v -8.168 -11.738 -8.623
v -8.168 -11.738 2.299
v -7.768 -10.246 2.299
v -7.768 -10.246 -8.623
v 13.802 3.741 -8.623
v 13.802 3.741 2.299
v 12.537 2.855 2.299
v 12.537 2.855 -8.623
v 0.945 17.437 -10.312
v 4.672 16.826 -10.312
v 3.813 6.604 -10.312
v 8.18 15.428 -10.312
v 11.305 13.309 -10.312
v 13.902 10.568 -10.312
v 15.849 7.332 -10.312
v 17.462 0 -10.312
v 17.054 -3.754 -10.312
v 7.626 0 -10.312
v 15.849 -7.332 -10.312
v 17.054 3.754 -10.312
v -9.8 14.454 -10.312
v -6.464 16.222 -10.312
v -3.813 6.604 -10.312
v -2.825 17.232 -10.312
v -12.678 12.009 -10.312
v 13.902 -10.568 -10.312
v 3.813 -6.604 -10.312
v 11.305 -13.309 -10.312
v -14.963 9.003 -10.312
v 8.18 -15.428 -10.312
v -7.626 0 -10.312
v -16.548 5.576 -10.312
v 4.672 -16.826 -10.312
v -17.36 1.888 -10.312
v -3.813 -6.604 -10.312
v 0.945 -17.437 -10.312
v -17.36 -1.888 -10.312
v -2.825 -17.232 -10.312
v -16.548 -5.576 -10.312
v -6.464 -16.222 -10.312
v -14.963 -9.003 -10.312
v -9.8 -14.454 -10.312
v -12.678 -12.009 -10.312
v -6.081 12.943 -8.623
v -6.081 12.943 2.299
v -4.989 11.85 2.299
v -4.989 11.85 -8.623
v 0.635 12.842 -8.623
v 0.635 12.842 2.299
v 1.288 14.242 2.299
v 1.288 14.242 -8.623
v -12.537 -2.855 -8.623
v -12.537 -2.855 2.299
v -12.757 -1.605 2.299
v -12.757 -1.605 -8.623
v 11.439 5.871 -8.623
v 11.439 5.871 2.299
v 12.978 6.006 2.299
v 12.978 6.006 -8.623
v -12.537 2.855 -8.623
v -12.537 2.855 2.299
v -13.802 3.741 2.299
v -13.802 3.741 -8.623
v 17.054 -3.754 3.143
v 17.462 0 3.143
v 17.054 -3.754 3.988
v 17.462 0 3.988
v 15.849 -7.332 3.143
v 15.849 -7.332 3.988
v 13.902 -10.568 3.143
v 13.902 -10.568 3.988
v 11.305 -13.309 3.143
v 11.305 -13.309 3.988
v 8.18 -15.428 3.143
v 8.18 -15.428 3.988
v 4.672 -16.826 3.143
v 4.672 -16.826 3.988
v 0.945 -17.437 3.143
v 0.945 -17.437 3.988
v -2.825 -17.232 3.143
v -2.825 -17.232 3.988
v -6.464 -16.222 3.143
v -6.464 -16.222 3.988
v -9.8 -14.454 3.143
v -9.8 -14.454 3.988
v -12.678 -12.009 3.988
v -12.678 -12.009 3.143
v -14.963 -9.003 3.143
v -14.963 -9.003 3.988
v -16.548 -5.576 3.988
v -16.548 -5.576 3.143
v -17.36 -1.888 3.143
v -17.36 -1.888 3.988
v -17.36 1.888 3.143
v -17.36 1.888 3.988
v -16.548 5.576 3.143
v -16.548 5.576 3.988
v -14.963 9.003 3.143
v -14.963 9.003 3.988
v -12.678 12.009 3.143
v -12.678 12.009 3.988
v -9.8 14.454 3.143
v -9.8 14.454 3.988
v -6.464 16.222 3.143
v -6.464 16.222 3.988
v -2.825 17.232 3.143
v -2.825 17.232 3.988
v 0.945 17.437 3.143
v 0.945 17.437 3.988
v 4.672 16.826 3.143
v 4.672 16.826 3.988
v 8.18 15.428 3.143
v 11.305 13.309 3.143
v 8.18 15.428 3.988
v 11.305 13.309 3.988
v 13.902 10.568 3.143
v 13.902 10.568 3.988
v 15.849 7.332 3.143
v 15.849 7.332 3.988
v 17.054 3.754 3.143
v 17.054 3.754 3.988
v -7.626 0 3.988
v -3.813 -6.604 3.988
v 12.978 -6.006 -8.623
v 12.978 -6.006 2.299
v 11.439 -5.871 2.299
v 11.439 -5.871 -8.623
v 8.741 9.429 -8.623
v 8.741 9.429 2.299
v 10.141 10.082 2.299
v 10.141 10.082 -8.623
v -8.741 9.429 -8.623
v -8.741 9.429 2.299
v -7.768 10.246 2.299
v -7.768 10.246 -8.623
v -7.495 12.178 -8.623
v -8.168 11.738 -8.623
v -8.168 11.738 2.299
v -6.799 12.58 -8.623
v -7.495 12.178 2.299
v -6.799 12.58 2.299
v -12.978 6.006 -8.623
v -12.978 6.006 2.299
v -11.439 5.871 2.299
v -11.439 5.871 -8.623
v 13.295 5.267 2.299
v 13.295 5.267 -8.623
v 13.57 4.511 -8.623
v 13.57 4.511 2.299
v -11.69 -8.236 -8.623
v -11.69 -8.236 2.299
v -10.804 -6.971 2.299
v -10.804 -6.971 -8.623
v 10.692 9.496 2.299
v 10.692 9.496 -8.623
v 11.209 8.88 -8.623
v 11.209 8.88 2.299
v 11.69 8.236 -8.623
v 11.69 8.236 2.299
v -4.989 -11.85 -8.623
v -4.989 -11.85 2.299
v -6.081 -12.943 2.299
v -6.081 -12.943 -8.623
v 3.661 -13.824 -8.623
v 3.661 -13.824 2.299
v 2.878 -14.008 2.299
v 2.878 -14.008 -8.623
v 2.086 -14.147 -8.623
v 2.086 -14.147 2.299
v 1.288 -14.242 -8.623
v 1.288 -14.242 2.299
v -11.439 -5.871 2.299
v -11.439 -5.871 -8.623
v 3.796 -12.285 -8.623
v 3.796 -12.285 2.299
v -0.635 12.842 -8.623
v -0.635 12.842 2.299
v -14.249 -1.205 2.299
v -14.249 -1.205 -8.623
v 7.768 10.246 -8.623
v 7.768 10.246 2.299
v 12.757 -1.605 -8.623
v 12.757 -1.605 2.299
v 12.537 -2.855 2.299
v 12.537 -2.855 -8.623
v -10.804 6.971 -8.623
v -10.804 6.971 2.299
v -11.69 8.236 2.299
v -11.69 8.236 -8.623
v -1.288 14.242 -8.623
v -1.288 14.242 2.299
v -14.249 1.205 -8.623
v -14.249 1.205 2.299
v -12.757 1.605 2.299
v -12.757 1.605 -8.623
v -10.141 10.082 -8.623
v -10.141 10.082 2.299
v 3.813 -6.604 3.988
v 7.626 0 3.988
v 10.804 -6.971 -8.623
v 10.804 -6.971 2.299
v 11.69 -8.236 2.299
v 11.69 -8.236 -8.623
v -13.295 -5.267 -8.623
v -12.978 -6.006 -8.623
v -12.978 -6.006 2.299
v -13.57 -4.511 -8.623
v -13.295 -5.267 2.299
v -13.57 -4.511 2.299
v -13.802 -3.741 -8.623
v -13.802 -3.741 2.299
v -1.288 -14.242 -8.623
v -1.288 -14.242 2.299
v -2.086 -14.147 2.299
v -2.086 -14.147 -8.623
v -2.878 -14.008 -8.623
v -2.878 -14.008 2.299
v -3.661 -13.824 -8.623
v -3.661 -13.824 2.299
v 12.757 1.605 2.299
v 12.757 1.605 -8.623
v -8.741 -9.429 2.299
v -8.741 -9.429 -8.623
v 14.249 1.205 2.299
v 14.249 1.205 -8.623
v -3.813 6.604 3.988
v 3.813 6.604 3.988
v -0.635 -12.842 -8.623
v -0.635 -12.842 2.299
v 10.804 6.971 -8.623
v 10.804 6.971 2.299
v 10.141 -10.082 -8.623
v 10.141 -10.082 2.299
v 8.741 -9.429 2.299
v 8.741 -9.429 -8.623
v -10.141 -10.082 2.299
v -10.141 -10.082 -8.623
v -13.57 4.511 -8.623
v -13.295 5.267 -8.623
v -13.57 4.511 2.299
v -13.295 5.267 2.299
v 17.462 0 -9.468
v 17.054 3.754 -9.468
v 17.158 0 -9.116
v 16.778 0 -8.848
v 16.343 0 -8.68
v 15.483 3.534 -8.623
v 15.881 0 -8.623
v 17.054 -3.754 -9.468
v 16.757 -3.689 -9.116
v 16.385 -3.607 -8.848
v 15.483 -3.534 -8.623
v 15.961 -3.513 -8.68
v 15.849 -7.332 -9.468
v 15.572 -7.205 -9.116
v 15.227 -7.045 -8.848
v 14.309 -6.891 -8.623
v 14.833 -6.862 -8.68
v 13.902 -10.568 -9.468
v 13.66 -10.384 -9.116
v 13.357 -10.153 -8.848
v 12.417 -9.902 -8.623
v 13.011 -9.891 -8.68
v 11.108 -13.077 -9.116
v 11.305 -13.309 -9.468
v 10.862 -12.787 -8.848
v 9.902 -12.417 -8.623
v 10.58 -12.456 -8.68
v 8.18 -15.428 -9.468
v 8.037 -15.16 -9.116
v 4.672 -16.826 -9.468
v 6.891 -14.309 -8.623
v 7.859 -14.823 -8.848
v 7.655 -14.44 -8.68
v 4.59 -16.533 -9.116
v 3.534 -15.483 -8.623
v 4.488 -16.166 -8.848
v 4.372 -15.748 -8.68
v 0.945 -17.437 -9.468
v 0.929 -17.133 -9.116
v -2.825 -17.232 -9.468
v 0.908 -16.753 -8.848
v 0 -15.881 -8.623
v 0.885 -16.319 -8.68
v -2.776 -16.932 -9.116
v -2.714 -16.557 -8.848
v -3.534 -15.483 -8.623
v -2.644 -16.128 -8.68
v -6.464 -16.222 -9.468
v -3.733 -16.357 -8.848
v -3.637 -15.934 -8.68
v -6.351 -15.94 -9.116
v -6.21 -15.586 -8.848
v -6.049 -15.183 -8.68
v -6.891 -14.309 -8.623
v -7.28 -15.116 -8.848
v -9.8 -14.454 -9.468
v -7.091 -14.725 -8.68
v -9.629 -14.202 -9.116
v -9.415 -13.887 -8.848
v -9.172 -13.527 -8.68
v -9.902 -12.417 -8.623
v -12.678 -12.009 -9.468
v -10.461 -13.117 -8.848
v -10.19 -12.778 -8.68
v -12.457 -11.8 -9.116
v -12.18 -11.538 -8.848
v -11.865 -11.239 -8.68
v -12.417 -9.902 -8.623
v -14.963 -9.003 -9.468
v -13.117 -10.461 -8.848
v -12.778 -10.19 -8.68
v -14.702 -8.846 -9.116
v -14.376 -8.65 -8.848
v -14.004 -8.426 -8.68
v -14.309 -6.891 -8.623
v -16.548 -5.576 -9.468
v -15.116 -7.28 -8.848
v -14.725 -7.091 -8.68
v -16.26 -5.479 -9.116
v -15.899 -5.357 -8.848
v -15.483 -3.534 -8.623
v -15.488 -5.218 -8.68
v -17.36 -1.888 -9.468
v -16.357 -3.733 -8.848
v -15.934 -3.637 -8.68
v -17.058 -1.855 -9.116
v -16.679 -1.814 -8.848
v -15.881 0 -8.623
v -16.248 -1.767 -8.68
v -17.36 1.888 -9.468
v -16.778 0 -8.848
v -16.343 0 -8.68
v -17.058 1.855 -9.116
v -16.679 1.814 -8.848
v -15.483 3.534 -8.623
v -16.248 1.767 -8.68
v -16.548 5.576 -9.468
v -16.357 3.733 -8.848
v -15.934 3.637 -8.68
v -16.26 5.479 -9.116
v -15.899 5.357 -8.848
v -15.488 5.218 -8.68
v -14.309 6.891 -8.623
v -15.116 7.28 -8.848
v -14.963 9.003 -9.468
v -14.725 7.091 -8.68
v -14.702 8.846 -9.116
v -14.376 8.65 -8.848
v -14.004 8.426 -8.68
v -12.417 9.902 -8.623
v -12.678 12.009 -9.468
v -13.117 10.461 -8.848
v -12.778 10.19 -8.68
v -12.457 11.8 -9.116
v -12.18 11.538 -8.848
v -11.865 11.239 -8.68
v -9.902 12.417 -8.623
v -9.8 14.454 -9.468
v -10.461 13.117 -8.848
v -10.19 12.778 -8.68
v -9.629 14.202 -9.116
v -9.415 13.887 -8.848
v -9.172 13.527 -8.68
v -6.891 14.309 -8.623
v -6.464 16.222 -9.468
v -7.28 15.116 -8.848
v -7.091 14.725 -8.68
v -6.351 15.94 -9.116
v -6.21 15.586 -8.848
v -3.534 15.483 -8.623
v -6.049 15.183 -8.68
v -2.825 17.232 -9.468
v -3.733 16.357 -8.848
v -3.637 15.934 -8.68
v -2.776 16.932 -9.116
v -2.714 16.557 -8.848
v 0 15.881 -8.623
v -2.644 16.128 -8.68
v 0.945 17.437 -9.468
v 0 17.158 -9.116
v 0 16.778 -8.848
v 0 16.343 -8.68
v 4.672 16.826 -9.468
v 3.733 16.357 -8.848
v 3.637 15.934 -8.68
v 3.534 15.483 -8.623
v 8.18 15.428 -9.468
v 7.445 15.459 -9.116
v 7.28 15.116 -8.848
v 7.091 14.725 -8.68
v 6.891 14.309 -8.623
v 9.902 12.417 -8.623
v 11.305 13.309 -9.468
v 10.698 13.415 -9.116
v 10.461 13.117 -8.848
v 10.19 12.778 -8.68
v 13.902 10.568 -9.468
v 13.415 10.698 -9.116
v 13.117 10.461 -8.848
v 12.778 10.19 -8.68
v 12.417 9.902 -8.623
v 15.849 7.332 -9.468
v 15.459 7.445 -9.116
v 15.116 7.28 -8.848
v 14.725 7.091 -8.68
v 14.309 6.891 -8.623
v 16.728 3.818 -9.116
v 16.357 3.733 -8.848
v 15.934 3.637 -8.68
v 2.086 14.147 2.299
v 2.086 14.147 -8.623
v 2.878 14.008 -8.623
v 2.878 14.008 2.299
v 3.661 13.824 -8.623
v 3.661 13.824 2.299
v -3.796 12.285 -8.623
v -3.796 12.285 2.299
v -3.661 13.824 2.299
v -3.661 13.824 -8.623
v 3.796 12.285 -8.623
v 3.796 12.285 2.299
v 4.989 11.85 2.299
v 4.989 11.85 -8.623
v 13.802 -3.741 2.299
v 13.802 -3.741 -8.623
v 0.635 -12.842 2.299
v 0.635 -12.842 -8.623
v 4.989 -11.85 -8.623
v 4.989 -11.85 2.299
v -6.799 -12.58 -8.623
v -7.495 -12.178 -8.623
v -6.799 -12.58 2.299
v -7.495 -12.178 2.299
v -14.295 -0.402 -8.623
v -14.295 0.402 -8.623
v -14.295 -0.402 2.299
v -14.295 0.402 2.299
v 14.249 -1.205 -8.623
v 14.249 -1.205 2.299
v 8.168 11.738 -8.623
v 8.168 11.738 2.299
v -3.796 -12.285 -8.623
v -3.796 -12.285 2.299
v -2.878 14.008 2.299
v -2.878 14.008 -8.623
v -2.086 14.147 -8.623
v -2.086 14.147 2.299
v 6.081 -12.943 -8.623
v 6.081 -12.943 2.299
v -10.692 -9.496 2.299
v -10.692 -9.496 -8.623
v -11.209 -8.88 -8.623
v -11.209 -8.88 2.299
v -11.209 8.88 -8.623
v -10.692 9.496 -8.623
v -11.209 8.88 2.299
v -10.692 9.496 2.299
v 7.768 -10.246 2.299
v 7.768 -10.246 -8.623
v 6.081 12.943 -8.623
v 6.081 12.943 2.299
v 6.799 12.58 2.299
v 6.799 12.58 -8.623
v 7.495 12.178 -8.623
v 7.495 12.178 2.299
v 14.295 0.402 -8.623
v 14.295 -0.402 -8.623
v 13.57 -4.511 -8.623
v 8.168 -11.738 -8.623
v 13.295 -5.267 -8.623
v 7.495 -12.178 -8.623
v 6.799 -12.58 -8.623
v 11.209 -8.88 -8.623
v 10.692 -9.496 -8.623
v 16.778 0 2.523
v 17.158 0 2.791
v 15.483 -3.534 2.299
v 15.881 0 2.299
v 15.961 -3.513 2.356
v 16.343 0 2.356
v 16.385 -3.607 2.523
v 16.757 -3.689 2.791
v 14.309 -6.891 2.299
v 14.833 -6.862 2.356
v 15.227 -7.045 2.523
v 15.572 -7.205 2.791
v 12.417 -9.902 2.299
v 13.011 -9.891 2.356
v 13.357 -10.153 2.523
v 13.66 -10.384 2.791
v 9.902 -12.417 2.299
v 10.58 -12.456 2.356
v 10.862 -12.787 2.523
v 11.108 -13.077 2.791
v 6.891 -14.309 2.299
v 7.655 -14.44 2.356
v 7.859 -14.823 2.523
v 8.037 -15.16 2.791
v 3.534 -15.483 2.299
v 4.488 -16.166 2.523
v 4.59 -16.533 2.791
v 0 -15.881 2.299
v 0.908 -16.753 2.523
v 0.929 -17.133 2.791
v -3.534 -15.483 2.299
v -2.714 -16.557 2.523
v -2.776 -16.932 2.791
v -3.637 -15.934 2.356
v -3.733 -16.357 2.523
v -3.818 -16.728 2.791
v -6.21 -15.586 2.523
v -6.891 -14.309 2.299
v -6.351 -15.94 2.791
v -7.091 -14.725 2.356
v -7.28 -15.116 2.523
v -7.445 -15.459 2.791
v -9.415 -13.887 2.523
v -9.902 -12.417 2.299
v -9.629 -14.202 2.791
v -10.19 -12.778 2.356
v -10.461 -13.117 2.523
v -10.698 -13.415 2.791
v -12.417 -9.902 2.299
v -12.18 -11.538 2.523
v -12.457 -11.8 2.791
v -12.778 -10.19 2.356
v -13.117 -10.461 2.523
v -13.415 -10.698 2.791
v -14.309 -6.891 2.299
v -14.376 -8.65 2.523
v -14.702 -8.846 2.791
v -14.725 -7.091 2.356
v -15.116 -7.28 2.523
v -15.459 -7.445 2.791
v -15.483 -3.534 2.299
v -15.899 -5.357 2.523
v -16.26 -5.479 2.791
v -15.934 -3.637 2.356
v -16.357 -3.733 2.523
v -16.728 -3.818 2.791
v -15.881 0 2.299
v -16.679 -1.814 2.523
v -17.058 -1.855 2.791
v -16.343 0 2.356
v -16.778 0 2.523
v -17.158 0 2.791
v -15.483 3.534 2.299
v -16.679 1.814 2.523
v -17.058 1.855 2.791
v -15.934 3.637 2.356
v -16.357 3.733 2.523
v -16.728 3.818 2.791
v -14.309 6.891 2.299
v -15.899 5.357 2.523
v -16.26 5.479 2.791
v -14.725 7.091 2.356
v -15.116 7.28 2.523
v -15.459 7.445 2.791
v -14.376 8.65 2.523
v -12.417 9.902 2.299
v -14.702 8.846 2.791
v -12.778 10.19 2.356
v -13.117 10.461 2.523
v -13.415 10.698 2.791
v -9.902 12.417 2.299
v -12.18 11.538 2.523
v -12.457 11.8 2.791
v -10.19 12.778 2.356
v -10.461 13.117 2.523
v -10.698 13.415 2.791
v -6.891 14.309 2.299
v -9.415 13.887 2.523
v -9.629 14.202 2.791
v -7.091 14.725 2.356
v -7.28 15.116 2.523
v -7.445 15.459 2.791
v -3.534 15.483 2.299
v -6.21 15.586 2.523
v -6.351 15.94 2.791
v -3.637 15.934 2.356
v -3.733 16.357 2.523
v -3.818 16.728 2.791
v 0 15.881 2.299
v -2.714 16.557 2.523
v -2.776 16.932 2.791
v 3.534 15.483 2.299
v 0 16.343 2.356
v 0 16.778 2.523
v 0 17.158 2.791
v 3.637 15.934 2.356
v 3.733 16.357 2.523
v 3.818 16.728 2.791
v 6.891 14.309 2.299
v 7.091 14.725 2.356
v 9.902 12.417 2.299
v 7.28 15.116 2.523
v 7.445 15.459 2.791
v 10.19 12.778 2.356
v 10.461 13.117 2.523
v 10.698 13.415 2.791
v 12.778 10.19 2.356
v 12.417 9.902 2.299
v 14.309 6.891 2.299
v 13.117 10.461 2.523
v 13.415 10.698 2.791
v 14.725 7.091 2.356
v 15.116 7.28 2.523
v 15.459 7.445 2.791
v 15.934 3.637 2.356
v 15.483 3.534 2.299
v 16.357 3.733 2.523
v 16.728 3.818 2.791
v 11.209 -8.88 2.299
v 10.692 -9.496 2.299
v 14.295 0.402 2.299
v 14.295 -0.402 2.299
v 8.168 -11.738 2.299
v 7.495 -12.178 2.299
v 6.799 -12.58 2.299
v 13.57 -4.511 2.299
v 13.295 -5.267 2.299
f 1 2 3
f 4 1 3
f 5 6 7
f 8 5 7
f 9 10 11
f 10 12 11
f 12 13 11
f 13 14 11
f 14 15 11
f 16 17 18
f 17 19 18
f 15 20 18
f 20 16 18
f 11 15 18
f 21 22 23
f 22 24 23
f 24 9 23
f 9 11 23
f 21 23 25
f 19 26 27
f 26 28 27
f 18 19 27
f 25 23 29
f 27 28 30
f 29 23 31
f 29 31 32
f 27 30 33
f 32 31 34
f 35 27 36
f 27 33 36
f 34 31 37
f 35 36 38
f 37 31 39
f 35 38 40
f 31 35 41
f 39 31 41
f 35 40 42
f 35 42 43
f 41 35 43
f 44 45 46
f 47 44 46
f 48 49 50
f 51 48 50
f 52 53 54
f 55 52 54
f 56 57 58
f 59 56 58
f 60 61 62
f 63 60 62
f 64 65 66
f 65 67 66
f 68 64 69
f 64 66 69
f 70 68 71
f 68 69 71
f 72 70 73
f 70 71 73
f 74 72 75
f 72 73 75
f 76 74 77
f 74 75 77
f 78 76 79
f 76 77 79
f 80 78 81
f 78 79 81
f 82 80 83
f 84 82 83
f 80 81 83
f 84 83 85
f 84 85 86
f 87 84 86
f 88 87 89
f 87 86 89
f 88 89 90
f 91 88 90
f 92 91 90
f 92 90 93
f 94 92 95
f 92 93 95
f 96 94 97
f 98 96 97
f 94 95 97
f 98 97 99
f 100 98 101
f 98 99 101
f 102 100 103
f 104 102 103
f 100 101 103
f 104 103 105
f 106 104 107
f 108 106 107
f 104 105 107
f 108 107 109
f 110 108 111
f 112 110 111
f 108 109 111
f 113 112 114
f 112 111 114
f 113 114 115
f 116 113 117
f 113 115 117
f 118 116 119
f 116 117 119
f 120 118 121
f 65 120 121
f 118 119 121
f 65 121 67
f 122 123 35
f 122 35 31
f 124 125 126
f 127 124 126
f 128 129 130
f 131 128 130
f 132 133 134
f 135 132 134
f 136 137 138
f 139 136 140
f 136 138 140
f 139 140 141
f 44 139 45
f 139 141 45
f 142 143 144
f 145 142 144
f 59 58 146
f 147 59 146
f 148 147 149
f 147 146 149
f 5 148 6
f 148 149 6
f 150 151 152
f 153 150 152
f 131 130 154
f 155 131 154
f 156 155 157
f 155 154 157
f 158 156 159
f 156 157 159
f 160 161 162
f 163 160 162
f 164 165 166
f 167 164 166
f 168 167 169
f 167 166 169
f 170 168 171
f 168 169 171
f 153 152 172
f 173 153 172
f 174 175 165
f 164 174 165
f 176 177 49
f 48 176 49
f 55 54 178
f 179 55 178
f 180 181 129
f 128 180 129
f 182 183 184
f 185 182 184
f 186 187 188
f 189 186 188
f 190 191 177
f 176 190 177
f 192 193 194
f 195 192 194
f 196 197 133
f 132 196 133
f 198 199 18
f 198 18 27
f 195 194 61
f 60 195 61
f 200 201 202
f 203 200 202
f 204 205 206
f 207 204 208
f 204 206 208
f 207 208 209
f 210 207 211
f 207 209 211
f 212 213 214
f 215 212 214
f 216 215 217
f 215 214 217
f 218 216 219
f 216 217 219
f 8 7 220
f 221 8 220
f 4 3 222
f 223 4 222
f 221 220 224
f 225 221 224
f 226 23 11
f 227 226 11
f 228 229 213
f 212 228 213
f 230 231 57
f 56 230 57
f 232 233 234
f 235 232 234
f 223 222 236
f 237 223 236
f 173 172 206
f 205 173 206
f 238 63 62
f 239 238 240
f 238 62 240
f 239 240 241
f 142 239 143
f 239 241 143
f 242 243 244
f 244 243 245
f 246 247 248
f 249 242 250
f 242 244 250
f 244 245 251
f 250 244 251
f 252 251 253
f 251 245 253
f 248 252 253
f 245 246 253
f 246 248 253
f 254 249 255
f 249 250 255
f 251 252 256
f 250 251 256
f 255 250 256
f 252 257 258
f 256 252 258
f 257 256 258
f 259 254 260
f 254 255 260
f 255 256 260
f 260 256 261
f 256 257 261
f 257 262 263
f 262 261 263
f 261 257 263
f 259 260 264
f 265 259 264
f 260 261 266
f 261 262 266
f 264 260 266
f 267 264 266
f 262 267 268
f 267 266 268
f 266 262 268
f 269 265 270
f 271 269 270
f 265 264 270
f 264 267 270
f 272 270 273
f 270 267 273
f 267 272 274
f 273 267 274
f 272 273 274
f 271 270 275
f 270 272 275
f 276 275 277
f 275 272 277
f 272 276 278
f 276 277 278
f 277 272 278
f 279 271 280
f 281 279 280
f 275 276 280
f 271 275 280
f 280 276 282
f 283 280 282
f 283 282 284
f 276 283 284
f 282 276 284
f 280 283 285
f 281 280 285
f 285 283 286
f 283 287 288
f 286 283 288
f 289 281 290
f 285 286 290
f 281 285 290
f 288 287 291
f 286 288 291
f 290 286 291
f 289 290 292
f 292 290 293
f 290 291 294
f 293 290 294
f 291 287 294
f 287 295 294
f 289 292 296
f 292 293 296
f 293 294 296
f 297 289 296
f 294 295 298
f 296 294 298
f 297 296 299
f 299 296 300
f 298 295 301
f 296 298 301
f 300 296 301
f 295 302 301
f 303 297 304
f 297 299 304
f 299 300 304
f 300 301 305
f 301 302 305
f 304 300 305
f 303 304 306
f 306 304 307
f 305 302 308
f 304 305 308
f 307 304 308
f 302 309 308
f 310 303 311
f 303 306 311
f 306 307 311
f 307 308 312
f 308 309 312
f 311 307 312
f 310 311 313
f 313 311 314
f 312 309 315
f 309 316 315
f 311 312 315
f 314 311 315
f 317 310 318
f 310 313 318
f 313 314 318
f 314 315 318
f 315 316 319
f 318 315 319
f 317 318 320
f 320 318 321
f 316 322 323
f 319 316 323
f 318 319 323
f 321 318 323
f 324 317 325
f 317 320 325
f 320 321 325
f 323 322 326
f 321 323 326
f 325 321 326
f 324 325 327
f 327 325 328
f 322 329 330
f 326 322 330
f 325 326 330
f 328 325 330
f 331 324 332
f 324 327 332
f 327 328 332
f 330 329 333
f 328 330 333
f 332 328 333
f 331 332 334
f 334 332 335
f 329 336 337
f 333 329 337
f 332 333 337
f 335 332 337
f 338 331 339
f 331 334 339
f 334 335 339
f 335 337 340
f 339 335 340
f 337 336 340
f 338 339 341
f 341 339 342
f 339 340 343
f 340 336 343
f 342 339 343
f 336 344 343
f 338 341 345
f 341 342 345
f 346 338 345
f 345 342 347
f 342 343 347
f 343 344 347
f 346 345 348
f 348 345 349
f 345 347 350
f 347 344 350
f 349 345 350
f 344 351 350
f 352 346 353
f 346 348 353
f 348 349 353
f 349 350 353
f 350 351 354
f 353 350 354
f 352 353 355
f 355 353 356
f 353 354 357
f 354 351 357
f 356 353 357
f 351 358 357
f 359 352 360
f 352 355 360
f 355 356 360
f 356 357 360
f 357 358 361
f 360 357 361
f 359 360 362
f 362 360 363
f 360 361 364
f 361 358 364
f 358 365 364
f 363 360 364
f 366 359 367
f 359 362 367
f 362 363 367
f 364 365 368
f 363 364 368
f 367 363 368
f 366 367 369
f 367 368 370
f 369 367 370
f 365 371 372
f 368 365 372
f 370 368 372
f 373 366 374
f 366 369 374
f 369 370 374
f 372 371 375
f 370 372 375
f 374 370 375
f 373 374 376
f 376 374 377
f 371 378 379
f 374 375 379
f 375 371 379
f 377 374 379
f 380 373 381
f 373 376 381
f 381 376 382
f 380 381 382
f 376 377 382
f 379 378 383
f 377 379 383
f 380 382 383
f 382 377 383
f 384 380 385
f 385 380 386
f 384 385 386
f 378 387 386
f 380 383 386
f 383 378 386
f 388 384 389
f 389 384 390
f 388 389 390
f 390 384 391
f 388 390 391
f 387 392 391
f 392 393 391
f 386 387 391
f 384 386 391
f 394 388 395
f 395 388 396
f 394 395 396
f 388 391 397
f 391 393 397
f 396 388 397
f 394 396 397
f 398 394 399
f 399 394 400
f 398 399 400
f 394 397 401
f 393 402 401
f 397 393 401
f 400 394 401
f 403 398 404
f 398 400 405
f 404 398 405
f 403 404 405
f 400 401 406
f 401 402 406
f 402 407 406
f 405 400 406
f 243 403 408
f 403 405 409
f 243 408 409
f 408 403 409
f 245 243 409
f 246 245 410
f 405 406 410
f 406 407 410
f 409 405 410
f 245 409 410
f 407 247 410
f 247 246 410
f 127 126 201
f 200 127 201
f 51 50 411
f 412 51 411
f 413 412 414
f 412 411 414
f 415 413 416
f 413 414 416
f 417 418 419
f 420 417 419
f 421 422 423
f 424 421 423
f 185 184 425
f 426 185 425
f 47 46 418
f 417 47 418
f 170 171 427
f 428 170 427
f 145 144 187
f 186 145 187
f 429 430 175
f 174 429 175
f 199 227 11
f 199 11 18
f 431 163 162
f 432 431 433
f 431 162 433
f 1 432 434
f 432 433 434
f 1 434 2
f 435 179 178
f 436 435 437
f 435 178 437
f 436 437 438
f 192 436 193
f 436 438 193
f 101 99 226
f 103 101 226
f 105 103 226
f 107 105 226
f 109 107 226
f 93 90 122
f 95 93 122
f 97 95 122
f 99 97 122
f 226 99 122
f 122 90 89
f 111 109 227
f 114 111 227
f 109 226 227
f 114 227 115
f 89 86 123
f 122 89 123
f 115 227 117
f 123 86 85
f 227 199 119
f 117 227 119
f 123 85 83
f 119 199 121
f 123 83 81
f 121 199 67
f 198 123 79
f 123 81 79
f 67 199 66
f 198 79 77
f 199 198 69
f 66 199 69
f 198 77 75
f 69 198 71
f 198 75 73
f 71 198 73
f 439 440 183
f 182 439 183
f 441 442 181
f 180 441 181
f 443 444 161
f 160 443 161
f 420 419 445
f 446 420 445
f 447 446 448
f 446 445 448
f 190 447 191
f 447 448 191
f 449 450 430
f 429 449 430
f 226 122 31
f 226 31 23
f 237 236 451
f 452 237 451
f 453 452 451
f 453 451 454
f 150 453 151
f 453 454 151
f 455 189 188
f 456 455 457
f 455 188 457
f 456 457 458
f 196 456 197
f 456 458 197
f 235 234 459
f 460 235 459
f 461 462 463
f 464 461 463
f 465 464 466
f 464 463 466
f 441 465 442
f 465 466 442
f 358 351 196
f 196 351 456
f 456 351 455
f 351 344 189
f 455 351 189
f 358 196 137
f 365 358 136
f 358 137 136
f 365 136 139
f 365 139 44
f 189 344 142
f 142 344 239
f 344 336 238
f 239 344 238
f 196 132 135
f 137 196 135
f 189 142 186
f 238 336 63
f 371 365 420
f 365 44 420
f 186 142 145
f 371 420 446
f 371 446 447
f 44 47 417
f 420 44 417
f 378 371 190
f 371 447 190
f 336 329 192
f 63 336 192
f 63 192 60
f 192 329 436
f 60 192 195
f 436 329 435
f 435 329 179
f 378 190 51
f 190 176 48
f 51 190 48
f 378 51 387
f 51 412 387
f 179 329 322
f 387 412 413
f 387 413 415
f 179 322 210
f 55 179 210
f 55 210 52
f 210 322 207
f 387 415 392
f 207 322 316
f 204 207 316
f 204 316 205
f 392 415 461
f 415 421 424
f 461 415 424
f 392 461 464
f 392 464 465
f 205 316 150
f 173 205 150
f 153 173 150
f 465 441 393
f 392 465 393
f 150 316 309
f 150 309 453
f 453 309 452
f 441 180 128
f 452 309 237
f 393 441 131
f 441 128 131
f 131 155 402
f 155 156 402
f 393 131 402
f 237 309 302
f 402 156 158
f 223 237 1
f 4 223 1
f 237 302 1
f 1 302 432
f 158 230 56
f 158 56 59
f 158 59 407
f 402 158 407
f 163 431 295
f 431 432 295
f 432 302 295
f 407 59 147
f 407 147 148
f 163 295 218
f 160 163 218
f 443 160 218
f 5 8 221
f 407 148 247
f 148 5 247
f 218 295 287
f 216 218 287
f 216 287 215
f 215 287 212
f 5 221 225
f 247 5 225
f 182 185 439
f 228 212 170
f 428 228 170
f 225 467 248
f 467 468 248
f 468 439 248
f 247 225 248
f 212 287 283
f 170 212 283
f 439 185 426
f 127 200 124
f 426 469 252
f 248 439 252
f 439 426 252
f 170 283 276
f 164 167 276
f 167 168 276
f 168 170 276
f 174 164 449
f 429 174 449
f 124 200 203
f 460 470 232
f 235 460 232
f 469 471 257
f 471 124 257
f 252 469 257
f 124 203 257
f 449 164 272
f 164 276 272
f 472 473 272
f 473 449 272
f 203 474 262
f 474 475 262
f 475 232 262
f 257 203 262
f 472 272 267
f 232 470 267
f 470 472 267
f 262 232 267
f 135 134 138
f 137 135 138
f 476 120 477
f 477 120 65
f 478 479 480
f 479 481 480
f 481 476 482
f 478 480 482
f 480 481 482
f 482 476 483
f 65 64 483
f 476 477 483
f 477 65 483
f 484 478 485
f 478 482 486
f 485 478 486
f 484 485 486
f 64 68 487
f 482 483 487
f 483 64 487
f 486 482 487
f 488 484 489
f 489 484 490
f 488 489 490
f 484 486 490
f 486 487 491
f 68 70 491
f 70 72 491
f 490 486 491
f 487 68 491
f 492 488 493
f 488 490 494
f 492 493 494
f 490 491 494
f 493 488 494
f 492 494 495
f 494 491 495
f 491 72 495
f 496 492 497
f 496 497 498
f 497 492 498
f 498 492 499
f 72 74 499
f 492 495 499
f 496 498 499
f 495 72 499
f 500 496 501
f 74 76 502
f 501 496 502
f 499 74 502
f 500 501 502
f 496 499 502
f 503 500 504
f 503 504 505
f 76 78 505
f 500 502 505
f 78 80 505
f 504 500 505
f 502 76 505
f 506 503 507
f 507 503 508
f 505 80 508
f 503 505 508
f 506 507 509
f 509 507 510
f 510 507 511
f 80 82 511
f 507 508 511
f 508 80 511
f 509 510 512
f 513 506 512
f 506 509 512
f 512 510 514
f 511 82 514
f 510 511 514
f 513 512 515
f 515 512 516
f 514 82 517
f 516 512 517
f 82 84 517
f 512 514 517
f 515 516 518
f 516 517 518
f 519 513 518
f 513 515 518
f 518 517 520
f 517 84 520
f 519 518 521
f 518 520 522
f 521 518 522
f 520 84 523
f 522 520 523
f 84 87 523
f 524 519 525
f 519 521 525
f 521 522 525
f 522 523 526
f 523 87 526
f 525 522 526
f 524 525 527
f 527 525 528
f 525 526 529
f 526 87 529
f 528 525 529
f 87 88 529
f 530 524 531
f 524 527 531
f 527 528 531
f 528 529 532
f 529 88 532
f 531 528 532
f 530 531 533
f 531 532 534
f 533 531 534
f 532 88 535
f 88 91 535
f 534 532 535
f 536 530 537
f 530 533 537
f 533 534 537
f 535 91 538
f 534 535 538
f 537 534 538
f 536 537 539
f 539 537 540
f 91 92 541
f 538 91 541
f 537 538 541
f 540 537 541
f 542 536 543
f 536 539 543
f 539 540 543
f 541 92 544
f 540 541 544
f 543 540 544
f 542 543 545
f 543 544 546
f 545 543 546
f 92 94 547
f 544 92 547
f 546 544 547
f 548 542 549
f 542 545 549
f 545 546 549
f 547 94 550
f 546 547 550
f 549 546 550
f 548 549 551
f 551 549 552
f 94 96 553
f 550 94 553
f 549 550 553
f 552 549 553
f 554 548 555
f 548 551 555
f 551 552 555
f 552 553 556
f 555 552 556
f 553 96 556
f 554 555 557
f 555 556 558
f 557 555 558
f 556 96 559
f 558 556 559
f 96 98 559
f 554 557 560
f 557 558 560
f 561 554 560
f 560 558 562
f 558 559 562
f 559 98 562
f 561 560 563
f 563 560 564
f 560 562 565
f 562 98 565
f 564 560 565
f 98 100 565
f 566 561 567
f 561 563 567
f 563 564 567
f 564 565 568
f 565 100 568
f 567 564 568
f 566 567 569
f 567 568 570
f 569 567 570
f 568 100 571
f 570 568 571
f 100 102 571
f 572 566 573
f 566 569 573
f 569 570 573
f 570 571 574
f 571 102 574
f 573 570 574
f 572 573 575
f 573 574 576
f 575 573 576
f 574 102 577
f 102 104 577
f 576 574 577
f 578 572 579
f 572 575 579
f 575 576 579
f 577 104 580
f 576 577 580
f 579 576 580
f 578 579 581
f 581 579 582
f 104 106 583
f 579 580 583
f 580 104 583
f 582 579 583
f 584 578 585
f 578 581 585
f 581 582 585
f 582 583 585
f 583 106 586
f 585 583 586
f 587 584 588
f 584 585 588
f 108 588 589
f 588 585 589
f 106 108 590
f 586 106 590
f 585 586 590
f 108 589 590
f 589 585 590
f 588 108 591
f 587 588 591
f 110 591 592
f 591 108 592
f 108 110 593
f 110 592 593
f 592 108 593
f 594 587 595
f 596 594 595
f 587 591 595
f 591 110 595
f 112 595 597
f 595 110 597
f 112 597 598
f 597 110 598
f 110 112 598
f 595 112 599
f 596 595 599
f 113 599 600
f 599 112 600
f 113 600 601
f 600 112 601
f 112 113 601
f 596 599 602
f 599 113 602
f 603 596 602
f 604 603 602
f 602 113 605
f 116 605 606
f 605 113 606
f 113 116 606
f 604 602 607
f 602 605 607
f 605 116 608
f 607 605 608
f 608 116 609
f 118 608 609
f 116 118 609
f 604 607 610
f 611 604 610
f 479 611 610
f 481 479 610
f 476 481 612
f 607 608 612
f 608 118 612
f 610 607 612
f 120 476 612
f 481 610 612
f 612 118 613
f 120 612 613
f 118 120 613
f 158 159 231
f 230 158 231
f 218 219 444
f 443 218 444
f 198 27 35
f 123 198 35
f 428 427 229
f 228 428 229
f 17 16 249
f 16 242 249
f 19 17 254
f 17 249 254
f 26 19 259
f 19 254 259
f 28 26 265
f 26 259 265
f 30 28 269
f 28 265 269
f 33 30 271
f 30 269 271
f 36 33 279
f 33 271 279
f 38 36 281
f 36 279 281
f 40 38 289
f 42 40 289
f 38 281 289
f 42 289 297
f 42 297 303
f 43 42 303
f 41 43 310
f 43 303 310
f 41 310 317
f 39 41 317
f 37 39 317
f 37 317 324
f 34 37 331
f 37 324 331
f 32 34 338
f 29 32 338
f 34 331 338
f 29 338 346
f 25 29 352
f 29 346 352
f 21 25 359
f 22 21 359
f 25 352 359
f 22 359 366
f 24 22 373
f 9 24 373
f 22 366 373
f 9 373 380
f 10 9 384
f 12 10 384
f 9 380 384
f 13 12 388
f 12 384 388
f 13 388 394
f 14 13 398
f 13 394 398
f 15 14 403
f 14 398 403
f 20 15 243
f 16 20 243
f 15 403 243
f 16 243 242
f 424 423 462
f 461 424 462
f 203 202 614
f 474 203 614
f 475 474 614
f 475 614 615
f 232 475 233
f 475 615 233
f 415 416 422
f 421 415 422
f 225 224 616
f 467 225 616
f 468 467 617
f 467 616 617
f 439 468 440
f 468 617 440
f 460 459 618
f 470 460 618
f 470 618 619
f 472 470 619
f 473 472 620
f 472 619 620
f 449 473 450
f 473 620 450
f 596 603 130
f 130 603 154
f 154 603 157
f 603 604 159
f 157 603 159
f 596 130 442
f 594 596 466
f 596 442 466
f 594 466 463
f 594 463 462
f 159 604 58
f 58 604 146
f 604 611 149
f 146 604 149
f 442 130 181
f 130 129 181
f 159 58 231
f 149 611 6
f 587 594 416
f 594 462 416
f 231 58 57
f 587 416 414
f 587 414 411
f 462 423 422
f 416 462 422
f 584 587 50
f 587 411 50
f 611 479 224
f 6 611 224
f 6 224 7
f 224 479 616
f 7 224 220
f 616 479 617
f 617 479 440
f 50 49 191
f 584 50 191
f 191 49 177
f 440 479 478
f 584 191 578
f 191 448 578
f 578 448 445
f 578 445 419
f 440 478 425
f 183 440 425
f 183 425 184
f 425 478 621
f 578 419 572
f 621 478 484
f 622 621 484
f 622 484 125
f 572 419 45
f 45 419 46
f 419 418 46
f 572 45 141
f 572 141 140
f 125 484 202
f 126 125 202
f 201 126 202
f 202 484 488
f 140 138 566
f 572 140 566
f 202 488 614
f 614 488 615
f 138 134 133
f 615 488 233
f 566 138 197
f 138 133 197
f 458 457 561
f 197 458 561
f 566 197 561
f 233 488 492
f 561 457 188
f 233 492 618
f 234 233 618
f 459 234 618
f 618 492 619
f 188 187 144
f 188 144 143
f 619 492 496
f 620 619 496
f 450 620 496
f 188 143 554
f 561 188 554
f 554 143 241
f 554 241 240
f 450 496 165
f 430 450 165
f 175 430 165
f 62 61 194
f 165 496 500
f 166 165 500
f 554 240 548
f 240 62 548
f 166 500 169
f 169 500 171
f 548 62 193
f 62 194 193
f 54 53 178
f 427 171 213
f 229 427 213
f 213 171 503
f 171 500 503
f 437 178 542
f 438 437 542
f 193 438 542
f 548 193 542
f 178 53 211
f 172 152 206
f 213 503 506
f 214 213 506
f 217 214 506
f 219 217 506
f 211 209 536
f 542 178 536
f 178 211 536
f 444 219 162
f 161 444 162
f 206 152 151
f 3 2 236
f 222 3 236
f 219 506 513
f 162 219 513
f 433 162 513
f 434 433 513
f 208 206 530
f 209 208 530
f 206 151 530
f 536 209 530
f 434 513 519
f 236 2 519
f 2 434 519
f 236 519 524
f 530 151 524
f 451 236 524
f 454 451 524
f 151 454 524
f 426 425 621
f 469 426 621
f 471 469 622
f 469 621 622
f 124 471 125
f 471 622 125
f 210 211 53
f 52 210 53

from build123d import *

# Parameters (mm, degrees)
CUT_EXTRUDE1_START = 2.2987
CUT_EXTRUDE1_DEPTH = 10.922
CIRPATTERN1_COUNT  = 18
SKETCH4_R          = 2.0828
CUT_EXTRUDE2_DEPTH = 27.762350537
CUT_EXTRUDE3_DEPTH = 1.5621
CIRPATTERN2_COUNT  = 2
CIRPATTERN2_ANGLE  = 90
CUT_EXTRUDE4_DEPTH = 33.175459463
SKETCH8_R          = 13.842582523
CUT_EXTRUDE5_DEPTH = 29.537230639


with BuildPart() as part:
    # Sketch2 → Revolve1 (revolve)
    with BuildSketch(Plane(origin=(0, 0, 0), x_dir=(0, 0, -1), z_dir=(1, 0, 0)), mode=Mode.PRIVATE) as revolve1_sk:
        with BuildLine():
            Line((-10.3124, 4.7625), (10.3124, 4.7625))
            Line((10.3124, 4.7625), (10.3124, 17.4625))
            Line((10.3124, 17.4625), (9.46785, 17.4625))
            ThreePointArc((9.46785, 17.4625), (8.847668679, 16.777633999), (8.6233, 15.88135))
            Line((8.6233, 15.88135), (8.6233, 14.3002))
            Line((8.6233, 14.3002), (-2.2987, 14.3002))
            Line((-2.2987, 14.3002), (-2.2987, 15.88135))
            ThreePointArc((-2.2987, 15.88135), (-2.523068679, 16.777633999), (-3.14325, 17.4625))
            Line((-3.14325, 17.4625), (-3.9878, 17.4625))
            Line((-3.9878, 17.4625), (-3.9878, 10.3124))
            Line((-3.9878, 10.3124), (-10.3124, 10.3124))
            Line((-10.3124, 10.3124), (-10.3124, 4.7625))
        make_face()
    revolve(revolve1_sk.sketch.rotate(Axis((0, 0, 10.3124), (0, 0, -1)), 90), axis=Axis((0, 0, 10.3124), (0, 0, -1)))

    # Sketch3 → Cut-Extrude1 (cut)
    with BuildSketch(Plane.XY.offset(CUT_EXTRUDE1_START)):
        with BuildLine():
            Line((-0.635, 12.842092967), (0.635, 12.842092967))
            Line((0.635, 12.842092967), (1.287830721, 14.242092967))
            ThreePointArc((1.287830721, 14.242092967), (0, 14.3002), (-1.287830721, 14.242092967))
            Line((-1.287830721, 14.242092967), (-0.635, 12.842092967))
        make_face()
    cut_extrude1 = extrude(amount=-CUT_EXTRUDE1_DEPTH, mode=Mode.SUBTRACT)

    # CirPattern1: Cut-Extrude1 ×18 about axis
    cirpattern1_axis = Axis((0, 0, 0), (0, 0, 1))
    for i in range(1, CIRPATTERN1_COUNT):
        add(cut_extrude1.rotate(cirpattern1_axis, i * 360 / CIRPATTERN1_COUNT), mode=Mode.SUBTRACT)

    # Sketch4 → Cut-Extrude2 (cut, through all)
    with BuildSketch(Plane(origin=(0, 0, 0), x_dir=(1, 0, 0), z_dir=(0, 1, 0))):
        with Locations(Location((0, -7.1501, 0), (0, 0, 90))):
            Circle(SKETCH4_R)
    cut_extrude2 = extrude(amount=CUT_EXTRUDE2_DEPTH, mode=Mode.SUBTRACT)

    # Sketch5 → Revolve2 (revolve)
    with BuildSketch(Plane.XY.offset(7.1501), mode=Mode.PRIVATE) as revolve2_sk:
        Polygon((1.5748, 10.099878114), (2.0828, 9.591878114), (2.0828, 5.3975), (1.4478, 4.7625), (0, 4.7625), (0, 10.099878114), align=None)
    revolve2 = revolve(revolve2_sk.sketch.rotate(Axis((0, 0, 7.1501), (0, 1, 0)), 90), axis=Axis((0, 0, 7.1501), (0, 1, 0)))

    # Sketch6 → Cut-Extrude3 (cut)
    with BuildSketch(Plane(origin=(0, 10.099878114, 0), x_dir=(1, 0, 0), z_dir=(0, 1, 0))):
        Polygon((0, -5.947594859), (-1.0414, -6.54884743), (-1.0414, -7.75135257), (0, -8.352605141), (1.0414, -7.75135257), (1.0414, -6.54884743), align=None)
    cut_extrude3 = extrude(amount=-CUT_EXTRUDE3_DEPTH, mode=Mode.SUBTRACT)

    # CirPattern2: Cut-Extrude2, Revolve2, Cut-Extrude3 ×2 about axis
    cirpattern2_axis = Axis((0, 0, 0), (0, 0, -1))
    add([cut_extrude2.rotate(cirpattern2_axis, i * CIRPATTERN2_ANGLE / (CIRPATTERN2_COUNT - 1)) for i in range(1, CIRPATTERN2_COUNT)], mode=Mode.SUBTRACT)
    add([revolve2.rotate(cirpattern2_axis, i * CIRPATTERN2_ANGLE / (CIRPATTERN2_COUNT - 1)) for i in range(1, CIRPATTERN2_COUNT)])
    add([cut_extrude3.rotate(cirpattern2_axis, i * CIRPATTERN2_ANGLE / (CIRPATTERN2_COUNT - 1)) for i in range(1, CIRPATTERN2_COUNT)], mode=Mode.SUBTRACT)

    # Sketch7 → Cut-Extrude4 (cut, through all)
    with BuildSketch(Plane(origin=(0, 0, -10.3124), x_dir=(-1, 0, 0), z_dir=(0, 0, -1))):
        Polygon((3.812821178, -6.604), (7.625642355, 0), (3.812821178, 6.604), (-3.812821178, 6.604), (-7.625642355, 0), (-3.812821178, -6.604), align=None)
    extrude(amount=-CUT_EXTRUDE4_DEPTH, mode=Mode.SUBTRACT)

    # Sketch8 → Cut-Extrude5 (cut, through all)
    with BuildSketch(Plane.XY.offset(3.9878)):
        Circle(SKETCH8_R)
    extrude(amount=CUT_EXTRUDE5_DEPTH, mode=Mode.SUBTRACT)


solid = part.part
